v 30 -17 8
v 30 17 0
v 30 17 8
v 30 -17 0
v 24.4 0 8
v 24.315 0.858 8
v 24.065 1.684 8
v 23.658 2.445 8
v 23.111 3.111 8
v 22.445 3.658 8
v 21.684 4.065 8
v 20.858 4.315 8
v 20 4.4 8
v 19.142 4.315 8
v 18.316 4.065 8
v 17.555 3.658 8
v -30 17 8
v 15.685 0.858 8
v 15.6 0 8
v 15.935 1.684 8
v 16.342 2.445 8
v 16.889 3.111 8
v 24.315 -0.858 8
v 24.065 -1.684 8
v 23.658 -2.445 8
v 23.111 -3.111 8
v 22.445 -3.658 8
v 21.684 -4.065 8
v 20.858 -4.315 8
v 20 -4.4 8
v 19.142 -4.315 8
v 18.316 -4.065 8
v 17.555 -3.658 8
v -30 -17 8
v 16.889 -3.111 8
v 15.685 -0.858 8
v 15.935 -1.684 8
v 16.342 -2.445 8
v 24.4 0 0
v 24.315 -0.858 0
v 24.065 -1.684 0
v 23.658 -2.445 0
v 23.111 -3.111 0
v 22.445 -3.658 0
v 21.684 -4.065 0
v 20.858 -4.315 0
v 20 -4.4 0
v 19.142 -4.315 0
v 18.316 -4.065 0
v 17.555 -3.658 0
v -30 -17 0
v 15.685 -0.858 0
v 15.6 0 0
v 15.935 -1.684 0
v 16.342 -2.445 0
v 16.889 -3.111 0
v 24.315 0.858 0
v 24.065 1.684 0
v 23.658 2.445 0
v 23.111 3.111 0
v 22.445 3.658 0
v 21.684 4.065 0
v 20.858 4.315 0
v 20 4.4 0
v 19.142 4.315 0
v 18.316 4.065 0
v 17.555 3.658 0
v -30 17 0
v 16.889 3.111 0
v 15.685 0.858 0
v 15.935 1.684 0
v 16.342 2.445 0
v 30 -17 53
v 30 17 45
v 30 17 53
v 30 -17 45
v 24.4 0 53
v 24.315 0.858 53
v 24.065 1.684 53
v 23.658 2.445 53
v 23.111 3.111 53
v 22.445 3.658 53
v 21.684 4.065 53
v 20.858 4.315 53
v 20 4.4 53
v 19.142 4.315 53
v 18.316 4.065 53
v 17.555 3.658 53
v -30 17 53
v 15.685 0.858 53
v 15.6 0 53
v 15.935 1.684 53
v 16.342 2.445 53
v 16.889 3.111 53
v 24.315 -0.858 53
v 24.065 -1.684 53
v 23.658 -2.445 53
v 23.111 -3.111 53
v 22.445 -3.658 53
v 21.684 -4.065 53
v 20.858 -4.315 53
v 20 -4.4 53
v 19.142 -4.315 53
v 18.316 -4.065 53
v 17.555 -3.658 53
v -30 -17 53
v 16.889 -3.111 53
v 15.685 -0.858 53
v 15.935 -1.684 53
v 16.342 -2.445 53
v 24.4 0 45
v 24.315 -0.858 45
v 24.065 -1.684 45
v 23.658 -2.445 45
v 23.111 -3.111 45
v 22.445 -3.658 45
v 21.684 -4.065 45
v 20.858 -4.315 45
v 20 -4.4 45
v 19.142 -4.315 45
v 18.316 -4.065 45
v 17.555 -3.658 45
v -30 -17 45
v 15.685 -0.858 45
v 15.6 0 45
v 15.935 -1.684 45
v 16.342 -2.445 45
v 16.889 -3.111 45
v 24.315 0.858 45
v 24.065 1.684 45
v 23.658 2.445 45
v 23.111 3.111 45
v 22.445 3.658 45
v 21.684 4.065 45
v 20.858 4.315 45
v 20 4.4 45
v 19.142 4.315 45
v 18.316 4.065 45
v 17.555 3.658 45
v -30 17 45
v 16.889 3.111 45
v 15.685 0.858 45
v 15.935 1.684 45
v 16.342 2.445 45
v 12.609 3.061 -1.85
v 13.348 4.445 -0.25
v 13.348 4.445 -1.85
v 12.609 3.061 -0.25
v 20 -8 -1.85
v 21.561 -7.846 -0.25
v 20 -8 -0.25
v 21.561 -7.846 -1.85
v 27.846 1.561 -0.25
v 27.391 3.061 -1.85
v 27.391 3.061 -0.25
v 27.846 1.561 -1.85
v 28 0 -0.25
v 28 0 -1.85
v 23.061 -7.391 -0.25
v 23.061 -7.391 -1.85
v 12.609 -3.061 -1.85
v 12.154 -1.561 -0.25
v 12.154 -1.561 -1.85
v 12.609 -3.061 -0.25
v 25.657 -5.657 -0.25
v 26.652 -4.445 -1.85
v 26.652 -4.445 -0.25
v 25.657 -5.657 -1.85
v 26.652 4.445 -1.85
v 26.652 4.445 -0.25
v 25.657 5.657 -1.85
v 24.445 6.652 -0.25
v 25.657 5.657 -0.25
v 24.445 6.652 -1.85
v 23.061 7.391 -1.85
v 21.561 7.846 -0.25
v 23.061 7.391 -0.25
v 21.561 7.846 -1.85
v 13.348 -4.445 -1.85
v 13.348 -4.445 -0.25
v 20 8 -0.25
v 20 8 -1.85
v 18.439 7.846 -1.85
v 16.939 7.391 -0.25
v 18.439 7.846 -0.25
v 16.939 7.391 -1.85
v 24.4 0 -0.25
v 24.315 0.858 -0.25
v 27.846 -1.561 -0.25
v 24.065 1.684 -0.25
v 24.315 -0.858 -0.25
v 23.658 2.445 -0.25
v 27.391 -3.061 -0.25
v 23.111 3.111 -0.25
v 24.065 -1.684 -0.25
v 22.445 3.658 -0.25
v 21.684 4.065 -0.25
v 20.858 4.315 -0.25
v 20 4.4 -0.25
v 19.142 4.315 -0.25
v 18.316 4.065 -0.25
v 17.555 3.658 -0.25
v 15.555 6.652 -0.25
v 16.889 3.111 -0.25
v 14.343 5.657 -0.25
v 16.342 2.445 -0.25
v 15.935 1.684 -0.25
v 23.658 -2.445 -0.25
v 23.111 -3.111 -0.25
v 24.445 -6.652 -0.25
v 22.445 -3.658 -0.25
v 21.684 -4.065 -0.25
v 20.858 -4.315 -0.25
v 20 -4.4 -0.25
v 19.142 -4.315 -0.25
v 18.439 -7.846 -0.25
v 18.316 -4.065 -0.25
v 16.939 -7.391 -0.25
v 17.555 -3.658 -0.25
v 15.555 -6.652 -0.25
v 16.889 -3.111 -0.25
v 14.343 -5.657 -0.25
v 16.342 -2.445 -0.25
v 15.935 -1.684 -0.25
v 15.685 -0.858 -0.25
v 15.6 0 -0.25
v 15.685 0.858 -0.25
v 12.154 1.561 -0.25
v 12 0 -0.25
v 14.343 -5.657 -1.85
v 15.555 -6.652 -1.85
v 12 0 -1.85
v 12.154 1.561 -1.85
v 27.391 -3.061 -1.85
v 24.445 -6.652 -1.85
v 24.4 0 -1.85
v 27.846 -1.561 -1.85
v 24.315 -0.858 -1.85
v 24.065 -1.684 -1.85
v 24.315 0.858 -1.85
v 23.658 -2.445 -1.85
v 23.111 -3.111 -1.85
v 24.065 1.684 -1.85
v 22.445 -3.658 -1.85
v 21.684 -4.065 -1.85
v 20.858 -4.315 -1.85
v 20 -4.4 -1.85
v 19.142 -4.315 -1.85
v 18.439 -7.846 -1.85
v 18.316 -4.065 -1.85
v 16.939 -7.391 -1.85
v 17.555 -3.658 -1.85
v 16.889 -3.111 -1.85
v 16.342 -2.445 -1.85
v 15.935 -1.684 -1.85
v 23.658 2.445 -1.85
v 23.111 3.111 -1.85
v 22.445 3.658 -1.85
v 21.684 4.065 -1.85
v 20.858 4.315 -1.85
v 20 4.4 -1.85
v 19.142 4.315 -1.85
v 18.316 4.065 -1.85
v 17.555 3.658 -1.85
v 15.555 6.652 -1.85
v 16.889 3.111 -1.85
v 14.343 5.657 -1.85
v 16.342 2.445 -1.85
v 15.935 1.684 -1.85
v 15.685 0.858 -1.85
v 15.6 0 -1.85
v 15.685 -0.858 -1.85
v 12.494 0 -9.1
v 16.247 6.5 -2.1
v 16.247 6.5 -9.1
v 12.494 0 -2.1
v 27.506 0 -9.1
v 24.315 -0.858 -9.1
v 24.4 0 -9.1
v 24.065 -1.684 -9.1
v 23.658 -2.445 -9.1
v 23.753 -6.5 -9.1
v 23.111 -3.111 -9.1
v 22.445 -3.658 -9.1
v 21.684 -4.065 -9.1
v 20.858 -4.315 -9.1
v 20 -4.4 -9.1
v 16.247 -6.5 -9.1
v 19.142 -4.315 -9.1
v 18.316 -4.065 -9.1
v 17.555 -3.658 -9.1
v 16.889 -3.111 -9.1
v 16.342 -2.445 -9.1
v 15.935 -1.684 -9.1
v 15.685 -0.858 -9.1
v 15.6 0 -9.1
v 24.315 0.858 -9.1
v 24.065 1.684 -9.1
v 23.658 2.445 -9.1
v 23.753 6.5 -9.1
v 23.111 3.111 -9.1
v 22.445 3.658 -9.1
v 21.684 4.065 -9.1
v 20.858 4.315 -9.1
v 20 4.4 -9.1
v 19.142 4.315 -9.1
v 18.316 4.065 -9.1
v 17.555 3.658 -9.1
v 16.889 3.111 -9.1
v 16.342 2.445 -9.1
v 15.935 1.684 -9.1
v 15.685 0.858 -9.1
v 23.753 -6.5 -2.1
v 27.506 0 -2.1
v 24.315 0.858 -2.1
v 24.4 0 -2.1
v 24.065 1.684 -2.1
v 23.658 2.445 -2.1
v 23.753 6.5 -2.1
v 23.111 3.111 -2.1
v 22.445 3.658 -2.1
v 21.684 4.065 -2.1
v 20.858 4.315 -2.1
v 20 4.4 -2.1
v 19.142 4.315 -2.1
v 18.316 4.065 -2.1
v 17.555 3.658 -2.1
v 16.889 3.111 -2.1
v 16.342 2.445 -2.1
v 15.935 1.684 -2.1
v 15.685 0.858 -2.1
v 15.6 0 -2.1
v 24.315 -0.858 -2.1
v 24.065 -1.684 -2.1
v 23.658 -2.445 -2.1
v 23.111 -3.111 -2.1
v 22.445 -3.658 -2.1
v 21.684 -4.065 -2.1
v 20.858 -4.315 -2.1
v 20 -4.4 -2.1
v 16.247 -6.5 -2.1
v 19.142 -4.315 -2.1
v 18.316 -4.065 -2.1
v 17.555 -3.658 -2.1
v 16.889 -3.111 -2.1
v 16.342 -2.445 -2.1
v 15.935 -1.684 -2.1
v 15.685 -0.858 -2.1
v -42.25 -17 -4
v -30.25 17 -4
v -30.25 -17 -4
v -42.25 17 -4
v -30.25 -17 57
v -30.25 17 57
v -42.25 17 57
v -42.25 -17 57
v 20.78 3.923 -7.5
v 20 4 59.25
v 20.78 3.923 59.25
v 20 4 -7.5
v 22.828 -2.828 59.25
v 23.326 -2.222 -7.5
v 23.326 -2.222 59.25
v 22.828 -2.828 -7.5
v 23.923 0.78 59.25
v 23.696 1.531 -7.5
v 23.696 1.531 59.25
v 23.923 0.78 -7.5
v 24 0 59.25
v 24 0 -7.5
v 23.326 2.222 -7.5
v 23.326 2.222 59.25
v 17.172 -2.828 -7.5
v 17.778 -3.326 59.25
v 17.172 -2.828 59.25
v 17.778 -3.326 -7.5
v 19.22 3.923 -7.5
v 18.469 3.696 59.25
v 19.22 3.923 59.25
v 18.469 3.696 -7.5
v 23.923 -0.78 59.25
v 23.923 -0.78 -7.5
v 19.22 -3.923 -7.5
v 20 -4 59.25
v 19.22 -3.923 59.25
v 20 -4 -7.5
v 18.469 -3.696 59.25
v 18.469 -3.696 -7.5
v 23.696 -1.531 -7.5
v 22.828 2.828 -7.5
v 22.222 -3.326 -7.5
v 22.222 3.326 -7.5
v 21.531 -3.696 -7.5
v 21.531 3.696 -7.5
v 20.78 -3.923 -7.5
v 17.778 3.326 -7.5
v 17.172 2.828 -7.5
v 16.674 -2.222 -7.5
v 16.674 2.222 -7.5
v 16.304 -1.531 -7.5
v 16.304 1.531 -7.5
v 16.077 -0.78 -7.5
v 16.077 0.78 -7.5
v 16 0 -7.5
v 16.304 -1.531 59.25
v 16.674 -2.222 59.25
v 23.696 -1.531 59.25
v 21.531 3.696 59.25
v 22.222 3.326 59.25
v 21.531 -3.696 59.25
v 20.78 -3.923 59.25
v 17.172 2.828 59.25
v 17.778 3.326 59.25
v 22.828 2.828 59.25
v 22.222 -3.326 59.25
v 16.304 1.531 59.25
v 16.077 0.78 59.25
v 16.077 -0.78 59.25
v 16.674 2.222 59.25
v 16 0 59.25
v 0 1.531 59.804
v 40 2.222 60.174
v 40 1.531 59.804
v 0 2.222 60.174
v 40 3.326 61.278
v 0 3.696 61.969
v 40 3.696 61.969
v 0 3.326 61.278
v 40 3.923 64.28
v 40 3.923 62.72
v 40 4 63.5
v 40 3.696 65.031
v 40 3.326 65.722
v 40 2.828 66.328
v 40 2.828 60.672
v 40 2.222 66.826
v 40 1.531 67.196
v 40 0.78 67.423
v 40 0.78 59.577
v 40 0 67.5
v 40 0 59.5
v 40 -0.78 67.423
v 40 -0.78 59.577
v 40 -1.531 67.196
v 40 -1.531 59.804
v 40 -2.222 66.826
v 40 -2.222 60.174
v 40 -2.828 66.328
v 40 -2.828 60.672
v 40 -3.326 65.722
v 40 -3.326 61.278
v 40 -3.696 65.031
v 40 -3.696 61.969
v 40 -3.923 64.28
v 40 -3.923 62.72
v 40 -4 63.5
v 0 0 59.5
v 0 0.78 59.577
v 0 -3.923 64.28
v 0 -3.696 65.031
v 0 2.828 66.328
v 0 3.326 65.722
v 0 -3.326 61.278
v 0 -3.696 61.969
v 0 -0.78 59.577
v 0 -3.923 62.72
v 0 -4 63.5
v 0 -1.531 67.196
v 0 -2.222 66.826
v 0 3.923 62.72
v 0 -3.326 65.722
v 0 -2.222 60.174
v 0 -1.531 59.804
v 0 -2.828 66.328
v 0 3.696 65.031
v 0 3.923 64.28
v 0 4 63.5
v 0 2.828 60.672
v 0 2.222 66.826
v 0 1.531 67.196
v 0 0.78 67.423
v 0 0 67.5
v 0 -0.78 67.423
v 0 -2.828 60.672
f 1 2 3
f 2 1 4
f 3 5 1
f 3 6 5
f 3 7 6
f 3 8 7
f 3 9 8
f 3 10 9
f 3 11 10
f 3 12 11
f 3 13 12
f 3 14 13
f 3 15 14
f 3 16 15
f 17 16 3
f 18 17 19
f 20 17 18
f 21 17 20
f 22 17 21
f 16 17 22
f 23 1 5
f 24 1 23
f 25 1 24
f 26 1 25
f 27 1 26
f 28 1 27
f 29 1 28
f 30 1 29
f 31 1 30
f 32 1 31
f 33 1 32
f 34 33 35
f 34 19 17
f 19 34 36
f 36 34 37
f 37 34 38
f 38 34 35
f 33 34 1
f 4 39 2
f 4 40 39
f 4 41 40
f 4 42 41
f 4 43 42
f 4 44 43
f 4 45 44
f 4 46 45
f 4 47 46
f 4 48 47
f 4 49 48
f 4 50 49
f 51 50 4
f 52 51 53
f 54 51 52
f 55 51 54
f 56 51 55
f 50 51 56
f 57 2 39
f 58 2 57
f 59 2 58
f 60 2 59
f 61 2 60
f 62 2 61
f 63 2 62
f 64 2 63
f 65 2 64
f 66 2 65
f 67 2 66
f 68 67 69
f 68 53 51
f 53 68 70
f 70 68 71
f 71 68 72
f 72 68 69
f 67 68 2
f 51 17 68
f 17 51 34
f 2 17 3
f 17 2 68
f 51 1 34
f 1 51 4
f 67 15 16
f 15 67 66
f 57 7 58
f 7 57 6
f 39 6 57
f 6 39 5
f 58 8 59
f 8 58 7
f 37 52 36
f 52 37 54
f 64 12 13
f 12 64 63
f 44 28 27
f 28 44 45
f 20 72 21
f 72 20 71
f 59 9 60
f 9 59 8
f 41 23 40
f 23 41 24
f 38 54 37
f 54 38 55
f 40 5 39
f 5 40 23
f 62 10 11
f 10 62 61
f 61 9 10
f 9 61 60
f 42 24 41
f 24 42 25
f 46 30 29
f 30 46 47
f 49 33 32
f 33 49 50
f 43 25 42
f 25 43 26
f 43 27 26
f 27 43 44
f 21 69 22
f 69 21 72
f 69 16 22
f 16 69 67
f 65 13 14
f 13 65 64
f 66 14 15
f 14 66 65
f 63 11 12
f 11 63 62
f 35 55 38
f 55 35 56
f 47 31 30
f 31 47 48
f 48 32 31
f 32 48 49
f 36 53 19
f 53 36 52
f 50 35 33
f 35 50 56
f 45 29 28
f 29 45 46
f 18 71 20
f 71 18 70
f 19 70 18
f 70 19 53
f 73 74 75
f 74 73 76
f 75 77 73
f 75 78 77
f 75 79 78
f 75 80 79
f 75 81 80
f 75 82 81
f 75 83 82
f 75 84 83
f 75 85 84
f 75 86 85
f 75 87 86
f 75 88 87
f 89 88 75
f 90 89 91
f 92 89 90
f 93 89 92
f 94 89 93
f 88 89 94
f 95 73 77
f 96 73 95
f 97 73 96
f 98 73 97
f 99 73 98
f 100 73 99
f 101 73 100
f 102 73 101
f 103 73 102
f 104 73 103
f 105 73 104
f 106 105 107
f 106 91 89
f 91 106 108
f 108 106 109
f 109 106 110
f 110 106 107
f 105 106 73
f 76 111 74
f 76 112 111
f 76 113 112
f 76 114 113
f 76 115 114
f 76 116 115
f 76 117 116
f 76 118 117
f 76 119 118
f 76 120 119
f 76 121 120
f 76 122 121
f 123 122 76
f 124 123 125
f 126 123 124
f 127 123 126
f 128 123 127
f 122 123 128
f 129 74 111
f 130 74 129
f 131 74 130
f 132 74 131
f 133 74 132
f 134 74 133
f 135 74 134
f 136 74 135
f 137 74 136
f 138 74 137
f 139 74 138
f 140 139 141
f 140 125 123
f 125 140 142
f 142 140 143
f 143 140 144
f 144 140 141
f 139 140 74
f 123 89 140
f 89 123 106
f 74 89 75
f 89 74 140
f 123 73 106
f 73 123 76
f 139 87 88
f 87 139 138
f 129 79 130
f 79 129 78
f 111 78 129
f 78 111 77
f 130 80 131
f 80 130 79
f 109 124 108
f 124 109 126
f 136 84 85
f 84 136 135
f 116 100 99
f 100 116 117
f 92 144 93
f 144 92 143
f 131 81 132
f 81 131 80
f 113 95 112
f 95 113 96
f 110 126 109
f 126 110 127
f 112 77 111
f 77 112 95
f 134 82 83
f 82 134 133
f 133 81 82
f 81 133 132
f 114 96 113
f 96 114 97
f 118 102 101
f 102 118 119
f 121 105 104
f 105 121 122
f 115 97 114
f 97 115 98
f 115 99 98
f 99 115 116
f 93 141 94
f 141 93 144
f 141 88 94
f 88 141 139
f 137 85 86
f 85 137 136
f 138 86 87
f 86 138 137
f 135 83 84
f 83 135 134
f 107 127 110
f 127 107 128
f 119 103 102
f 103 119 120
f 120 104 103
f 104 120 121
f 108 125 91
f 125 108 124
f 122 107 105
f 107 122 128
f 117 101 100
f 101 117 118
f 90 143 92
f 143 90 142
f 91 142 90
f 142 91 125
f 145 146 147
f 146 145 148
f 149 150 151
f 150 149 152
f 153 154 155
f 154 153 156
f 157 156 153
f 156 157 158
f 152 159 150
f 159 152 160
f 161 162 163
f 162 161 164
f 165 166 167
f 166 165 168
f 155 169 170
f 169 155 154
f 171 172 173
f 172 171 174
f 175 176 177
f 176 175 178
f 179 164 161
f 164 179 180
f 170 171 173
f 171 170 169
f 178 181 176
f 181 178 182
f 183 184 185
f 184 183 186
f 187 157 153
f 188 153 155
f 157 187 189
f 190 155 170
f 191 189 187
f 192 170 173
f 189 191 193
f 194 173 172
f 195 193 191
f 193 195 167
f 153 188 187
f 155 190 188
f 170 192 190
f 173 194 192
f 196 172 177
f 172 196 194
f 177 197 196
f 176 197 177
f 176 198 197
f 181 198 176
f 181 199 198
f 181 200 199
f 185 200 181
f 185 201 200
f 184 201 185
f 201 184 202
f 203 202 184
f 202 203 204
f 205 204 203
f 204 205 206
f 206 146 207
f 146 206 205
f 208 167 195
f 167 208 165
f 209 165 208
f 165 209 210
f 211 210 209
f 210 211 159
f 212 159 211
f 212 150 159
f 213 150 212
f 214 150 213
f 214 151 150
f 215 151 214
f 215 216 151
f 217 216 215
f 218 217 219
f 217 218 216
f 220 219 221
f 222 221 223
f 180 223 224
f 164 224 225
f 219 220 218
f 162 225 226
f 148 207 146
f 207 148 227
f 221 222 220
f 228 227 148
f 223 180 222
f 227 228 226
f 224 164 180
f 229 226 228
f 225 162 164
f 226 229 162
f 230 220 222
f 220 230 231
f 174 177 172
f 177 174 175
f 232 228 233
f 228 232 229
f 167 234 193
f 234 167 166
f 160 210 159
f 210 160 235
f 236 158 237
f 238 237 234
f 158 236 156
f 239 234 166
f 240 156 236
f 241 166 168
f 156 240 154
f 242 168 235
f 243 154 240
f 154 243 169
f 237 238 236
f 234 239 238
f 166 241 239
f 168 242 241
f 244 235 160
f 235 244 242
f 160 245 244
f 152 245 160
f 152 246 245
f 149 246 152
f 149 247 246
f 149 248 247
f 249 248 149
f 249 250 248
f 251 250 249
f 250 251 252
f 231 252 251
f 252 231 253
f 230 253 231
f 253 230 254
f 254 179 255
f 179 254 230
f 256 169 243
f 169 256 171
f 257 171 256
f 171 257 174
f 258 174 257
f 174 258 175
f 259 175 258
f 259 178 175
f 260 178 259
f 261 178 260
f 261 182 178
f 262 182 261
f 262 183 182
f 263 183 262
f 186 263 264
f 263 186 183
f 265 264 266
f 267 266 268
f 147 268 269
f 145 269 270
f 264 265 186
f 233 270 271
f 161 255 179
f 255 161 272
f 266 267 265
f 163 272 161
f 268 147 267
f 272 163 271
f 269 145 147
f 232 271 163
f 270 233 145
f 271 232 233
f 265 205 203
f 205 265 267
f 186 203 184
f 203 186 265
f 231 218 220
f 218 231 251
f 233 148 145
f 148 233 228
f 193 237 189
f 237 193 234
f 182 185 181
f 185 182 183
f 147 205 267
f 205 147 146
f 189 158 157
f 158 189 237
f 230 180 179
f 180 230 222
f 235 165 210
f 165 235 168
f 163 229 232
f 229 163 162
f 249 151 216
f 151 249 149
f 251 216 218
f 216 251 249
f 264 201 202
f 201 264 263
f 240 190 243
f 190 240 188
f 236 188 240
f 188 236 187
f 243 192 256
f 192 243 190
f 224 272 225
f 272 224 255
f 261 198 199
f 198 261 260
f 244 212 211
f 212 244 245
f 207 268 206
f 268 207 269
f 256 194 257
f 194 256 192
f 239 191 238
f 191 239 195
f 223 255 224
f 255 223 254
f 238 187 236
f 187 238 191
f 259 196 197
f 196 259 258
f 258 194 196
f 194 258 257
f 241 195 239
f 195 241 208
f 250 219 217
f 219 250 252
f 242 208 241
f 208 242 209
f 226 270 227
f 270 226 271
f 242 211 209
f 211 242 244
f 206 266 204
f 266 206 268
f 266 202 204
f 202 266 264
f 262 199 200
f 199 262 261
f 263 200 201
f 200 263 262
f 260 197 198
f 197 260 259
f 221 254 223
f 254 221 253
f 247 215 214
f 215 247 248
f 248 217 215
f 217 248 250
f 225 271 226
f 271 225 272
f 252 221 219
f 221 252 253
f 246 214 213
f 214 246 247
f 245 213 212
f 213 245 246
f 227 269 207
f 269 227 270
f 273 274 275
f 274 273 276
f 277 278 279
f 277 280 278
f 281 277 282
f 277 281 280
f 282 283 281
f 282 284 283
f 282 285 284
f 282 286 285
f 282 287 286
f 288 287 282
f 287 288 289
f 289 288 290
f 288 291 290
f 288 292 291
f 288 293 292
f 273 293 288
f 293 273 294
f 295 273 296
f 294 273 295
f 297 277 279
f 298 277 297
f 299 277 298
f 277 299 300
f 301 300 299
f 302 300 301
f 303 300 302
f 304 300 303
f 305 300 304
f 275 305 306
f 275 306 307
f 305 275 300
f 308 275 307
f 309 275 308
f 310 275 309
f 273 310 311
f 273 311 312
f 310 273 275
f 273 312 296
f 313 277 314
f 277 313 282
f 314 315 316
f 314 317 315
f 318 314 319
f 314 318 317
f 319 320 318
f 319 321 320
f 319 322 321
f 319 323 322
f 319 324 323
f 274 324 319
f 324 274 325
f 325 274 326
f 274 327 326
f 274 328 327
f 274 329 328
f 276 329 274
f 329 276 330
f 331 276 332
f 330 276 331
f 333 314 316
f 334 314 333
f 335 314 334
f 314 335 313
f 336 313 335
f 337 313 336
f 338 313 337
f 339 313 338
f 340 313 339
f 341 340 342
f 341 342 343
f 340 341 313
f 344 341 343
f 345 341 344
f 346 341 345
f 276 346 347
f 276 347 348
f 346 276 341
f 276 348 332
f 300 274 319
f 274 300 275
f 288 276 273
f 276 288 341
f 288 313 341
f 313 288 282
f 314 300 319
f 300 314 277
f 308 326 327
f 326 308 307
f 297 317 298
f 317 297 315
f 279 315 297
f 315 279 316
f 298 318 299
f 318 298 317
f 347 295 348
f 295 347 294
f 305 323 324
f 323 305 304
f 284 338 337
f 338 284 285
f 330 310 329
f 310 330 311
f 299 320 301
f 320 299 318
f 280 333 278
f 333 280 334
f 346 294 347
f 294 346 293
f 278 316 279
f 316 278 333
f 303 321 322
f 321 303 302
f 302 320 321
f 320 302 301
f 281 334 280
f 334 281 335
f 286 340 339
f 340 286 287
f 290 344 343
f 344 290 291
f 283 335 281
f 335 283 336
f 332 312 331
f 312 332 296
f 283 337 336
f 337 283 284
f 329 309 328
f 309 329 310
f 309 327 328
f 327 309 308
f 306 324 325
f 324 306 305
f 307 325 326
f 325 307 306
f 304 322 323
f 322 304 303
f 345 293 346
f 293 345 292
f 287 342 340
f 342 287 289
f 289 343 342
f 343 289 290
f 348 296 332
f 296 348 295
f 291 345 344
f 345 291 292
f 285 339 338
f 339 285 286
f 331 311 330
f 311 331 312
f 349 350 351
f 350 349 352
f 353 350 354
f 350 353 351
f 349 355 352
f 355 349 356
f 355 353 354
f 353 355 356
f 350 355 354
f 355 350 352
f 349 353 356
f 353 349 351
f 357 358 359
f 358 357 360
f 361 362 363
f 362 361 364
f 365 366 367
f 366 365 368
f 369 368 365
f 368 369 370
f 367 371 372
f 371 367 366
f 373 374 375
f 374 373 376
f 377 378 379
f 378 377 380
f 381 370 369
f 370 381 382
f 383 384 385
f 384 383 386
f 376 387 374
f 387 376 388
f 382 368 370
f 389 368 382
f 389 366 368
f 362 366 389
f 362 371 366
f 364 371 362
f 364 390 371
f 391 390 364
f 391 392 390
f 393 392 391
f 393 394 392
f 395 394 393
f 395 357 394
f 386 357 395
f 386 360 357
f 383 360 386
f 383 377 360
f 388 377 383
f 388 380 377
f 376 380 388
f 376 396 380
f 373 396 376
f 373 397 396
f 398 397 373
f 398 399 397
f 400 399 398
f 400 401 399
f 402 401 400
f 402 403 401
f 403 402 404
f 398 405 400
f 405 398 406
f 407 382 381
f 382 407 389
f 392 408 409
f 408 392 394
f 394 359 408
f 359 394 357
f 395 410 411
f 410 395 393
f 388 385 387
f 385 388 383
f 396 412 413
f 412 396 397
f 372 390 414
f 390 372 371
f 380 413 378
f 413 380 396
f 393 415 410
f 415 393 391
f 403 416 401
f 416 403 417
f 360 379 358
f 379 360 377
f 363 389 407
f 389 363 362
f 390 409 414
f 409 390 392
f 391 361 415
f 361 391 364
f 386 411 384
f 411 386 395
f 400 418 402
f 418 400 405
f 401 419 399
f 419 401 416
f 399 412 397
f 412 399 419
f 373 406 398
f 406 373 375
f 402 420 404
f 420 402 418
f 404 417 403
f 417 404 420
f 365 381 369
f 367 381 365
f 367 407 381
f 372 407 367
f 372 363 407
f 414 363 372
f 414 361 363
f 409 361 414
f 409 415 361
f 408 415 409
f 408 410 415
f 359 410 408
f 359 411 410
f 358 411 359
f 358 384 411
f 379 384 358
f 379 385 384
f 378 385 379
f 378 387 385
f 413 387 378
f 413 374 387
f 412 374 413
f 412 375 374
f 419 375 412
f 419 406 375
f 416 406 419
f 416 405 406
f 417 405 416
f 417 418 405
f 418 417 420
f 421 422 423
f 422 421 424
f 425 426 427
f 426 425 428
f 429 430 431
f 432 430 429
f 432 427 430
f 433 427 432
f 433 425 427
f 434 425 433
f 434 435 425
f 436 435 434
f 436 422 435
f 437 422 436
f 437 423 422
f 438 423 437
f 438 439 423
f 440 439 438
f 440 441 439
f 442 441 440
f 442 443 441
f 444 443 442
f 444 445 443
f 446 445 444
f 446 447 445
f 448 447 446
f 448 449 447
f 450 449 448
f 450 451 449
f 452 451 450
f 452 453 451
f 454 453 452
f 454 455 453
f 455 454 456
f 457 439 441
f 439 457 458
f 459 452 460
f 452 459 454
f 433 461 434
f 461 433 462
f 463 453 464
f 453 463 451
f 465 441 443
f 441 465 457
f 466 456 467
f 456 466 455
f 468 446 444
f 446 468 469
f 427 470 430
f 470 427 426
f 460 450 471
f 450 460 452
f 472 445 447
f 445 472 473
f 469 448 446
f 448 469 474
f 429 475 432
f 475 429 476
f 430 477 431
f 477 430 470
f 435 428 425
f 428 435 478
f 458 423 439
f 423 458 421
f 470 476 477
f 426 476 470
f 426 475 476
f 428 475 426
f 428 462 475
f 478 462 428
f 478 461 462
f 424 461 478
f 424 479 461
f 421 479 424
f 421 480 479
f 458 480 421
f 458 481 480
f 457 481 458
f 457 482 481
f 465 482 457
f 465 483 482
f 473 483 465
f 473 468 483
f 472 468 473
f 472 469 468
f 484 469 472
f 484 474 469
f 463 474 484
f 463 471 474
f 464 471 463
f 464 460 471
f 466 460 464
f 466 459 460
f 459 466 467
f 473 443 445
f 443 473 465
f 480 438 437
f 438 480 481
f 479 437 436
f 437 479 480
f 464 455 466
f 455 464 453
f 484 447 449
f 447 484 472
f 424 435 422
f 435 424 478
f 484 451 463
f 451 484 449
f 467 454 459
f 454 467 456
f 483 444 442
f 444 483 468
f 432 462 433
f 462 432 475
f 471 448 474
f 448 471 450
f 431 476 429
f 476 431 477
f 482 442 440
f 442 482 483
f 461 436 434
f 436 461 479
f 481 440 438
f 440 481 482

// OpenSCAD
$fn = 32;

// ------------------------------------------------------------------------
// C clamp: throat 45 mm, screw d8
// Every part is its own module, assembly() places every instance.
// ------------------------------------------------------------------------

// --- part 1 ---
module clamp_arm() {
  difference() {
    translate([-30, -17, 0]) cube([60, 34, 8]);
    translate([20, 0, -1]) cylinder(h = 10, d = 8.8);
  }
}

// --- part 2 ---
module clamp_spine() {
  difference() {
    translate([-30.5, -17, 0]) cube([61, 34, 12]);
  }
}

// --- part 3 ---
module clamp_screw() {
  translate([0, 0, -33.375]) cylinder(h = 66.75, d = 8);
}

// --- part 4 ---
module clamp_washer() {
  difference() {
      translate([0, 0, 0]) cylinder(h = 1.6, d = 16);
      translate([0, 0, -1]) cylinder(h = 3.6, d = 8.8);
    }
}

// --- part 5 ---
module clamp_nut() {
  difference() {
    linear_extrude(height = 7) polygon(points = [[7.506, 0], [3.753, 6.5], [-3.753, 6.5], [-7.506, 0], [-3.753, -6.5], [3.753, -6.5]]);
    translate([0, 0, -1]) cylinder(h = 9, d = 8.8);
  }
}

// --- part 6 ---
module tommy_bar() {
  translate([0, 0, -20]) cylinder(h = 40, d = 8);
}

// --- assembly ---
module assembly() {
  color([0.80, 0.24, 0.20]) translate([0, 0, 0]) rotate([0, 0, 0]) clamp_arm();
  color([0.20, 0.45, 0.75]) translate([0, 0, 45]) rotate([0, 0, 0]) clamp_arm();
  color([0.25, 0.62, 0.32]) translate([-42.25, 0, 26.5]) rotate([0, 90, 0]) clamp_spine();
  color([0.92, 0.70, 0.18]) translate([20, 0, 25.875]) rotate([0, 0, 0]) clamp_screw();
  color([0.58, 0.35, 0.70]) translate([20, 0, -1.85]) rotate([0, 0, 0]) clamp_washer();
  color([0.16, 0.66, 0.66]) translate([20, 0, -9.1]) rotate([0, 0, 0]) clamp_nut();
  color([0.85, 0.48, 0.18]) translate([20, 0, 63.5]) rotate([0, 90, 0]) tommy_bar();
}

assembly();
